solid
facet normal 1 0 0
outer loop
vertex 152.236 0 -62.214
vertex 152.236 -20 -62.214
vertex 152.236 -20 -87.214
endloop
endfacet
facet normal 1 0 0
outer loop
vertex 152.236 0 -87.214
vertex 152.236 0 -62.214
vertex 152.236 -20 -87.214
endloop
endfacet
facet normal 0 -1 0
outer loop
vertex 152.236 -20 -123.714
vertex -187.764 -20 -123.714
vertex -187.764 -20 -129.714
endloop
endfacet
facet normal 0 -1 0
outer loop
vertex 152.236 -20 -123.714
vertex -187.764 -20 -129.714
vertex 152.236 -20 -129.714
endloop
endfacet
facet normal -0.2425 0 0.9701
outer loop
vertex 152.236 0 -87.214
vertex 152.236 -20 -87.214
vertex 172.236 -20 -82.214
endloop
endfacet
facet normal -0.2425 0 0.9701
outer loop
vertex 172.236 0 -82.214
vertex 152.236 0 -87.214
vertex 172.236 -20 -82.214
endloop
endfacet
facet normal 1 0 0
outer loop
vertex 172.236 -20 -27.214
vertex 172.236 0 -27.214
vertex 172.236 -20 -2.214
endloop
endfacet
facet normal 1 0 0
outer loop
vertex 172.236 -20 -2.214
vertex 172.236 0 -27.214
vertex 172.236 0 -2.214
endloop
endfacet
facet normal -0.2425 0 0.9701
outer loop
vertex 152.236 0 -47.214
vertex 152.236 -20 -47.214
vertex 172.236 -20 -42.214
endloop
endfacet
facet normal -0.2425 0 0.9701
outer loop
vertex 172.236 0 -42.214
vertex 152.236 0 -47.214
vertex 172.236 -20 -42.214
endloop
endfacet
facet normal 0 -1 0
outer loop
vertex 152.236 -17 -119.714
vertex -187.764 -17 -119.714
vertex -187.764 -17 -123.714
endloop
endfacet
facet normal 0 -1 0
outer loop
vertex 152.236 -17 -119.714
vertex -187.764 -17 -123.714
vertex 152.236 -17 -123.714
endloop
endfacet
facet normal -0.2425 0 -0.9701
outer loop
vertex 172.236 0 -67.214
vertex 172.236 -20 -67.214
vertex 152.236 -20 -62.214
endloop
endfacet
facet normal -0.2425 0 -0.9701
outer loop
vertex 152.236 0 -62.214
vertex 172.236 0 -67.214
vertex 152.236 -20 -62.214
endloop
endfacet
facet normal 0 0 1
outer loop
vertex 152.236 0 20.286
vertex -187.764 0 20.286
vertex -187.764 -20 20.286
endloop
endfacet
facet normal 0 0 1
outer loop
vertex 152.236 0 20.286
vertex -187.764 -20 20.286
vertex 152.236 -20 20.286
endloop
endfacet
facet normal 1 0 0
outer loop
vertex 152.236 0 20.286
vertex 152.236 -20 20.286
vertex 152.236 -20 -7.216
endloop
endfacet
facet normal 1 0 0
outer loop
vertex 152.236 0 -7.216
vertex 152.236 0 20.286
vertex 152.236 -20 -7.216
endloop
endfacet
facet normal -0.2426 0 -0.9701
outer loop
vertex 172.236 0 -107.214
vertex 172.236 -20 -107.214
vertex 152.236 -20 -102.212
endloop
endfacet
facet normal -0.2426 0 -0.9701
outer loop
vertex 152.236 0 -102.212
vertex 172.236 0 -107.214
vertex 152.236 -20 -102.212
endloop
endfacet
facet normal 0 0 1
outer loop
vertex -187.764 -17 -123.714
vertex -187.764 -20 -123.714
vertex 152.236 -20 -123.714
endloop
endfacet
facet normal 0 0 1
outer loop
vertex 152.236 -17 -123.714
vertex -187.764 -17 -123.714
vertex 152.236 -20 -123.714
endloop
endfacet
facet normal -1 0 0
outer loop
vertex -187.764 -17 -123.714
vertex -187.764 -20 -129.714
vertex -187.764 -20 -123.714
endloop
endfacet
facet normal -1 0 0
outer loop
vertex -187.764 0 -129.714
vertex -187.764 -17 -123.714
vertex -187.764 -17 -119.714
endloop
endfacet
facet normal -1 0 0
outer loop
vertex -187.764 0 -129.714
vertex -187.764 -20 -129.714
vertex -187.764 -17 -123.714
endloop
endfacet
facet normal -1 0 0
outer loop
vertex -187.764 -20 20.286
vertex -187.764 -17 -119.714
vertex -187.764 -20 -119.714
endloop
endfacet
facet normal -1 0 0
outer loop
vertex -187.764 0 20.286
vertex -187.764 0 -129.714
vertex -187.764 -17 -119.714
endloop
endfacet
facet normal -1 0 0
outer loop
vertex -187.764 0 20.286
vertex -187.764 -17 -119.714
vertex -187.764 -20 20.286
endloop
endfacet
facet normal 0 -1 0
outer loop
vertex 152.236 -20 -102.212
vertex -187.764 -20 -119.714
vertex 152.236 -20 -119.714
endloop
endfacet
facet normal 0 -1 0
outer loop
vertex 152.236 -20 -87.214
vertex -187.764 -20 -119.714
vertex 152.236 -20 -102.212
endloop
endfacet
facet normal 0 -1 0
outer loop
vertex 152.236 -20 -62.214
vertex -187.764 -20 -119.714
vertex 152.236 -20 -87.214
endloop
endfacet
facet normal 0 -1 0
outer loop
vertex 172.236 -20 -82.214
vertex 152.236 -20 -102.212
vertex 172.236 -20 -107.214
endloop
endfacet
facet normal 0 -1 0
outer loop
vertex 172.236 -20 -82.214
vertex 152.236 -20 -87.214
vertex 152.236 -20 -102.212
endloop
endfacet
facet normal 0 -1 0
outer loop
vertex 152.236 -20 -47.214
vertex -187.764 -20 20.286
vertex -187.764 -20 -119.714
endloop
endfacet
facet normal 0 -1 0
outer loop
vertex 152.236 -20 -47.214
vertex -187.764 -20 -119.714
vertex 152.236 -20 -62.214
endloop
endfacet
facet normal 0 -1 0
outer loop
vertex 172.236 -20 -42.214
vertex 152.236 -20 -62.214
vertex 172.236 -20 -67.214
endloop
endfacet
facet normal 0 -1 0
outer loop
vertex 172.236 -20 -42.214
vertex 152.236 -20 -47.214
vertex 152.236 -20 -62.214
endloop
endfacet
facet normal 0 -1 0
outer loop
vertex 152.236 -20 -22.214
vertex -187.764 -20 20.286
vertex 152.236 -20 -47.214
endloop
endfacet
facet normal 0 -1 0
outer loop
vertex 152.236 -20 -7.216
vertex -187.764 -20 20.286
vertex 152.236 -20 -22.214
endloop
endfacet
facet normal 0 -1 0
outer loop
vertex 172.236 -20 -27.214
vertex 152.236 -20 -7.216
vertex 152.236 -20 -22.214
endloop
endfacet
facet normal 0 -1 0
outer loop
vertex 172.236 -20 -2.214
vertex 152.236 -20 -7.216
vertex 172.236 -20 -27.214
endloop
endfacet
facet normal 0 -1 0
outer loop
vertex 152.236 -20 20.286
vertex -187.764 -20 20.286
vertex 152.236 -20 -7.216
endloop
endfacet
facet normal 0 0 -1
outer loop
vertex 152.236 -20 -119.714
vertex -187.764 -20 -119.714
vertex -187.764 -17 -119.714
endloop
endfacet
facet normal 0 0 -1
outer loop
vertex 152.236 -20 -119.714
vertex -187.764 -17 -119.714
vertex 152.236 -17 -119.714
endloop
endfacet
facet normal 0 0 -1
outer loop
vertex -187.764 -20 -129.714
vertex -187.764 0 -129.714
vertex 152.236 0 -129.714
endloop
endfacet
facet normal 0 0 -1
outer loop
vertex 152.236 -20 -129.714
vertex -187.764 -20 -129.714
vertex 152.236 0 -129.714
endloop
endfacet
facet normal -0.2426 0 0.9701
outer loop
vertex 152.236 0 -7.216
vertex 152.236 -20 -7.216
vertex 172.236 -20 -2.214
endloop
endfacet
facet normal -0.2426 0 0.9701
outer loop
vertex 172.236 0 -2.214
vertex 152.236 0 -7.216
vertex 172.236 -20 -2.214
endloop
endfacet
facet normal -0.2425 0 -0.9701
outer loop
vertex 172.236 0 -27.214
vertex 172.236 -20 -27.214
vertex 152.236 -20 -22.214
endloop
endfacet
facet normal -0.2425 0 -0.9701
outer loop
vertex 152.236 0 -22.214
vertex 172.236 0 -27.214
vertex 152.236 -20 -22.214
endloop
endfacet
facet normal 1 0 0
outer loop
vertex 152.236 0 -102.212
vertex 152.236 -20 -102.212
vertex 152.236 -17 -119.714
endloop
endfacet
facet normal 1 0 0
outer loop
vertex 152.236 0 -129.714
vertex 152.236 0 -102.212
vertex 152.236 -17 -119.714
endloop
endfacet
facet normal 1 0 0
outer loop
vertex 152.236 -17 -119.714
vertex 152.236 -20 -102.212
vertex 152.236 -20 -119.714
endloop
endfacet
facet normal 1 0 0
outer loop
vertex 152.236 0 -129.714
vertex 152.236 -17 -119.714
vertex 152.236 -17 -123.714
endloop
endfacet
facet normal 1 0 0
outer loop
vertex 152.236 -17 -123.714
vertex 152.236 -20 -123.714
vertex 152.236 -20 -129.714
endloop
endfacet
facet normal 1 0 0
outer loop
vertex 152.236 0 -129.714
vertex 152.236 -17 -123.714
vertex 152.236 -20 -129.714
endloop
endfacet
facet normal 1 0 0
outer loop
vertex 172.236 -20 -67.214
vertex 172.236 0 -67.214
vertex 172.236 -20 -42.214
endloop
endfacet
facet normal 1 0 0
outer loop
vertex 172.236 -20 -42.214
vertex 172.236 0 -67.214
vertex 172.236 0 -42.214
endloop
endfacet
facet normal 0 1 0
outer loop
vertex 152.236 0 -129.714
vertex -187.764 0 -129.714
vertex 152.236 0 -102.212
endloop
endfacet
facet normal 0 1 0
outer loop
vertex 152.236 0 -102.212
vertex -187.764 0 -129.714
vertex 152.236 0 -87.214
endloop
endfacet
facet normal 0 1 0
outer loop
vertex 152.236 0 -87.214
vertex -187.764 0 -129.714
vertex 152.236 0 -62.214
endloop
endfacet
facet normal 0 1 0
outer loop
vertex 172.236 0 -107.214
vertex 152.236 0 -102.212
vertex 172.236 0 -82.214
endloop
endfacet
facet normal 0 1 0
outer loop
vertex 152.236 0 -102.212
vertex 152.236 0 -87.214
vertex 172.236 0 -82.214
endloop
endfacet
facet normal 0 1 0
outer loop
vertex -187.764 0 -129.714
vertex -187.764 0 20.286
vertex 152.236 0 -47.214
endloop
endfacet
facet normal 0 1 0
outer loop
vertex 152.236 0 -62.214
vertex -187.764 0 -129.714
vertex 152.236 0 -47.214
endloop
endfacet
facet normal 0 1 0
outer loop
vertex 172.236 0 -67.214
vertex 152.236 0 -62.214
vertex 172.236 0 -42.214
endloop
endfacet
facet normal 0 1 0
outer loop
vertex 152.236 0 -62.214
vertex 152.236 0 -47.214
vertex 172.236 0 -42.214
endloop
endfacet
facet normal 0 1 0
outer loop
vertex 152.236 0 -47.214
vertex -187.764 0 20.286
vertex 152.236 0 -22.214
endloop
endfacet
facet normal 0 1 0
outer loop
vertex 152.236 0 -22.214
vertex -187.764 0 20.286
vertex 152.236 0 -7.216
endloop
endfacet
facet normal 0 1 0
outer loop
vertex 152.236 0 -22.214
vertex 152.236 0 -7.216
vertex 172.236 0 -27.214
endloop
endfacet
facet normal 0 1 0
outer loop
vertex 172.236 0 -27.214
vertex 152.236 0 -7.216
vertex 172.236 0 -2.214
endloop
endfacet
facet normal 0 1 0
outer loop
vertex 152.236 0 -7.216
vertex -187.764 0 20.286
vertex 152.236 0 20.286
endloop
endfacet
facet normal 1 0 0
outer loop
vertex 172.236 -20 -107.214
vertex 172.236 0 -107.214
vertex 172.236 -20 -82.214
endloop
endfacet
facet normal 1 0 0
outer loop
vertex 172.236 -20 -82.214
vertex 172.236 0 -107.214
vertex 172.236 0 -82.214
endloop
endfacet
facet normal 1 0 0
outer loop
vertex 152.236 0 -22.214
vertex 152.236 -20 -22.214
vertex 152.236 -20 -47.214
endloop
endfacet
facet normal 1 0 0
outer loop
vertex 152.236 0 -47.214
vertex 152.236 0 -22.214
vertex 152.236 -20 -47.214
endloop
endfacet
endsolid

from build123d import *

# Parameters (mm, degrees)
F0_W     = 360
F0_H     = 150
F1_DEPTH = 20
F3_DEPTH = 20
F4_W     = 340
F4_H     = 4
F5_DEPTH = 3


with BuildPart() as f1:
    # F0 (on Front) → F1 (new body)
    with BuildSketch(Plane.XZ):
        with Locations((-7.764109, -54.714244)):
            Rectangle(F0_W, F0_H)
    extrude(amount=F1_DEPTH)

    # F2 (on face) → F3 (cut)
    with BuildSketch(Plane.XZ.offset(20)):
        Polygon((172.235891, -27.214244), (152.235891, -22.214244), (152.235891, -47.214244), (172.235891, -42.214244), align=None)
        Polygon((172.235891, -67.214244), (152.235891, -62.214244), (152.235891, -87.214244), (172.235891, -82.214244), align=None)
        Polygon((152.235891, -102.212298), (152.235891, -127.216189), (172.235891, -122.214244), (172.235891, -107.214244), align=None)
        Polygon((172.235891, 12.785756), (152.235891, 17.787702), (152.235891, -7.216189), (172.235891, -2.214244), align=None)
        Polygon((172.235891, 20.285756), (152.235891, 20.285756), (152.235891, 17.787702), (172.235891, 12.785756), align=None)
        Polygon((152.235891, -127.216189), (152.235891, -129.714244), (172.235891, -129.714244), (172.235891, -122.214244), align=None)
    extrude(amount=-F3_DEPTH, mode=Mode.SUBTRACT)

    # F4 (on face) → F5 (cut)
    with BuildSketch(Plane.XZ.offset(20)):
        with Locations((-17.764109, -121.714244)):
            Rectangle(F4_W, F4_H)
    extrude(amount=-F5_DEPTH, mode=Mode.SUBTRACT)


solid = f1.part
